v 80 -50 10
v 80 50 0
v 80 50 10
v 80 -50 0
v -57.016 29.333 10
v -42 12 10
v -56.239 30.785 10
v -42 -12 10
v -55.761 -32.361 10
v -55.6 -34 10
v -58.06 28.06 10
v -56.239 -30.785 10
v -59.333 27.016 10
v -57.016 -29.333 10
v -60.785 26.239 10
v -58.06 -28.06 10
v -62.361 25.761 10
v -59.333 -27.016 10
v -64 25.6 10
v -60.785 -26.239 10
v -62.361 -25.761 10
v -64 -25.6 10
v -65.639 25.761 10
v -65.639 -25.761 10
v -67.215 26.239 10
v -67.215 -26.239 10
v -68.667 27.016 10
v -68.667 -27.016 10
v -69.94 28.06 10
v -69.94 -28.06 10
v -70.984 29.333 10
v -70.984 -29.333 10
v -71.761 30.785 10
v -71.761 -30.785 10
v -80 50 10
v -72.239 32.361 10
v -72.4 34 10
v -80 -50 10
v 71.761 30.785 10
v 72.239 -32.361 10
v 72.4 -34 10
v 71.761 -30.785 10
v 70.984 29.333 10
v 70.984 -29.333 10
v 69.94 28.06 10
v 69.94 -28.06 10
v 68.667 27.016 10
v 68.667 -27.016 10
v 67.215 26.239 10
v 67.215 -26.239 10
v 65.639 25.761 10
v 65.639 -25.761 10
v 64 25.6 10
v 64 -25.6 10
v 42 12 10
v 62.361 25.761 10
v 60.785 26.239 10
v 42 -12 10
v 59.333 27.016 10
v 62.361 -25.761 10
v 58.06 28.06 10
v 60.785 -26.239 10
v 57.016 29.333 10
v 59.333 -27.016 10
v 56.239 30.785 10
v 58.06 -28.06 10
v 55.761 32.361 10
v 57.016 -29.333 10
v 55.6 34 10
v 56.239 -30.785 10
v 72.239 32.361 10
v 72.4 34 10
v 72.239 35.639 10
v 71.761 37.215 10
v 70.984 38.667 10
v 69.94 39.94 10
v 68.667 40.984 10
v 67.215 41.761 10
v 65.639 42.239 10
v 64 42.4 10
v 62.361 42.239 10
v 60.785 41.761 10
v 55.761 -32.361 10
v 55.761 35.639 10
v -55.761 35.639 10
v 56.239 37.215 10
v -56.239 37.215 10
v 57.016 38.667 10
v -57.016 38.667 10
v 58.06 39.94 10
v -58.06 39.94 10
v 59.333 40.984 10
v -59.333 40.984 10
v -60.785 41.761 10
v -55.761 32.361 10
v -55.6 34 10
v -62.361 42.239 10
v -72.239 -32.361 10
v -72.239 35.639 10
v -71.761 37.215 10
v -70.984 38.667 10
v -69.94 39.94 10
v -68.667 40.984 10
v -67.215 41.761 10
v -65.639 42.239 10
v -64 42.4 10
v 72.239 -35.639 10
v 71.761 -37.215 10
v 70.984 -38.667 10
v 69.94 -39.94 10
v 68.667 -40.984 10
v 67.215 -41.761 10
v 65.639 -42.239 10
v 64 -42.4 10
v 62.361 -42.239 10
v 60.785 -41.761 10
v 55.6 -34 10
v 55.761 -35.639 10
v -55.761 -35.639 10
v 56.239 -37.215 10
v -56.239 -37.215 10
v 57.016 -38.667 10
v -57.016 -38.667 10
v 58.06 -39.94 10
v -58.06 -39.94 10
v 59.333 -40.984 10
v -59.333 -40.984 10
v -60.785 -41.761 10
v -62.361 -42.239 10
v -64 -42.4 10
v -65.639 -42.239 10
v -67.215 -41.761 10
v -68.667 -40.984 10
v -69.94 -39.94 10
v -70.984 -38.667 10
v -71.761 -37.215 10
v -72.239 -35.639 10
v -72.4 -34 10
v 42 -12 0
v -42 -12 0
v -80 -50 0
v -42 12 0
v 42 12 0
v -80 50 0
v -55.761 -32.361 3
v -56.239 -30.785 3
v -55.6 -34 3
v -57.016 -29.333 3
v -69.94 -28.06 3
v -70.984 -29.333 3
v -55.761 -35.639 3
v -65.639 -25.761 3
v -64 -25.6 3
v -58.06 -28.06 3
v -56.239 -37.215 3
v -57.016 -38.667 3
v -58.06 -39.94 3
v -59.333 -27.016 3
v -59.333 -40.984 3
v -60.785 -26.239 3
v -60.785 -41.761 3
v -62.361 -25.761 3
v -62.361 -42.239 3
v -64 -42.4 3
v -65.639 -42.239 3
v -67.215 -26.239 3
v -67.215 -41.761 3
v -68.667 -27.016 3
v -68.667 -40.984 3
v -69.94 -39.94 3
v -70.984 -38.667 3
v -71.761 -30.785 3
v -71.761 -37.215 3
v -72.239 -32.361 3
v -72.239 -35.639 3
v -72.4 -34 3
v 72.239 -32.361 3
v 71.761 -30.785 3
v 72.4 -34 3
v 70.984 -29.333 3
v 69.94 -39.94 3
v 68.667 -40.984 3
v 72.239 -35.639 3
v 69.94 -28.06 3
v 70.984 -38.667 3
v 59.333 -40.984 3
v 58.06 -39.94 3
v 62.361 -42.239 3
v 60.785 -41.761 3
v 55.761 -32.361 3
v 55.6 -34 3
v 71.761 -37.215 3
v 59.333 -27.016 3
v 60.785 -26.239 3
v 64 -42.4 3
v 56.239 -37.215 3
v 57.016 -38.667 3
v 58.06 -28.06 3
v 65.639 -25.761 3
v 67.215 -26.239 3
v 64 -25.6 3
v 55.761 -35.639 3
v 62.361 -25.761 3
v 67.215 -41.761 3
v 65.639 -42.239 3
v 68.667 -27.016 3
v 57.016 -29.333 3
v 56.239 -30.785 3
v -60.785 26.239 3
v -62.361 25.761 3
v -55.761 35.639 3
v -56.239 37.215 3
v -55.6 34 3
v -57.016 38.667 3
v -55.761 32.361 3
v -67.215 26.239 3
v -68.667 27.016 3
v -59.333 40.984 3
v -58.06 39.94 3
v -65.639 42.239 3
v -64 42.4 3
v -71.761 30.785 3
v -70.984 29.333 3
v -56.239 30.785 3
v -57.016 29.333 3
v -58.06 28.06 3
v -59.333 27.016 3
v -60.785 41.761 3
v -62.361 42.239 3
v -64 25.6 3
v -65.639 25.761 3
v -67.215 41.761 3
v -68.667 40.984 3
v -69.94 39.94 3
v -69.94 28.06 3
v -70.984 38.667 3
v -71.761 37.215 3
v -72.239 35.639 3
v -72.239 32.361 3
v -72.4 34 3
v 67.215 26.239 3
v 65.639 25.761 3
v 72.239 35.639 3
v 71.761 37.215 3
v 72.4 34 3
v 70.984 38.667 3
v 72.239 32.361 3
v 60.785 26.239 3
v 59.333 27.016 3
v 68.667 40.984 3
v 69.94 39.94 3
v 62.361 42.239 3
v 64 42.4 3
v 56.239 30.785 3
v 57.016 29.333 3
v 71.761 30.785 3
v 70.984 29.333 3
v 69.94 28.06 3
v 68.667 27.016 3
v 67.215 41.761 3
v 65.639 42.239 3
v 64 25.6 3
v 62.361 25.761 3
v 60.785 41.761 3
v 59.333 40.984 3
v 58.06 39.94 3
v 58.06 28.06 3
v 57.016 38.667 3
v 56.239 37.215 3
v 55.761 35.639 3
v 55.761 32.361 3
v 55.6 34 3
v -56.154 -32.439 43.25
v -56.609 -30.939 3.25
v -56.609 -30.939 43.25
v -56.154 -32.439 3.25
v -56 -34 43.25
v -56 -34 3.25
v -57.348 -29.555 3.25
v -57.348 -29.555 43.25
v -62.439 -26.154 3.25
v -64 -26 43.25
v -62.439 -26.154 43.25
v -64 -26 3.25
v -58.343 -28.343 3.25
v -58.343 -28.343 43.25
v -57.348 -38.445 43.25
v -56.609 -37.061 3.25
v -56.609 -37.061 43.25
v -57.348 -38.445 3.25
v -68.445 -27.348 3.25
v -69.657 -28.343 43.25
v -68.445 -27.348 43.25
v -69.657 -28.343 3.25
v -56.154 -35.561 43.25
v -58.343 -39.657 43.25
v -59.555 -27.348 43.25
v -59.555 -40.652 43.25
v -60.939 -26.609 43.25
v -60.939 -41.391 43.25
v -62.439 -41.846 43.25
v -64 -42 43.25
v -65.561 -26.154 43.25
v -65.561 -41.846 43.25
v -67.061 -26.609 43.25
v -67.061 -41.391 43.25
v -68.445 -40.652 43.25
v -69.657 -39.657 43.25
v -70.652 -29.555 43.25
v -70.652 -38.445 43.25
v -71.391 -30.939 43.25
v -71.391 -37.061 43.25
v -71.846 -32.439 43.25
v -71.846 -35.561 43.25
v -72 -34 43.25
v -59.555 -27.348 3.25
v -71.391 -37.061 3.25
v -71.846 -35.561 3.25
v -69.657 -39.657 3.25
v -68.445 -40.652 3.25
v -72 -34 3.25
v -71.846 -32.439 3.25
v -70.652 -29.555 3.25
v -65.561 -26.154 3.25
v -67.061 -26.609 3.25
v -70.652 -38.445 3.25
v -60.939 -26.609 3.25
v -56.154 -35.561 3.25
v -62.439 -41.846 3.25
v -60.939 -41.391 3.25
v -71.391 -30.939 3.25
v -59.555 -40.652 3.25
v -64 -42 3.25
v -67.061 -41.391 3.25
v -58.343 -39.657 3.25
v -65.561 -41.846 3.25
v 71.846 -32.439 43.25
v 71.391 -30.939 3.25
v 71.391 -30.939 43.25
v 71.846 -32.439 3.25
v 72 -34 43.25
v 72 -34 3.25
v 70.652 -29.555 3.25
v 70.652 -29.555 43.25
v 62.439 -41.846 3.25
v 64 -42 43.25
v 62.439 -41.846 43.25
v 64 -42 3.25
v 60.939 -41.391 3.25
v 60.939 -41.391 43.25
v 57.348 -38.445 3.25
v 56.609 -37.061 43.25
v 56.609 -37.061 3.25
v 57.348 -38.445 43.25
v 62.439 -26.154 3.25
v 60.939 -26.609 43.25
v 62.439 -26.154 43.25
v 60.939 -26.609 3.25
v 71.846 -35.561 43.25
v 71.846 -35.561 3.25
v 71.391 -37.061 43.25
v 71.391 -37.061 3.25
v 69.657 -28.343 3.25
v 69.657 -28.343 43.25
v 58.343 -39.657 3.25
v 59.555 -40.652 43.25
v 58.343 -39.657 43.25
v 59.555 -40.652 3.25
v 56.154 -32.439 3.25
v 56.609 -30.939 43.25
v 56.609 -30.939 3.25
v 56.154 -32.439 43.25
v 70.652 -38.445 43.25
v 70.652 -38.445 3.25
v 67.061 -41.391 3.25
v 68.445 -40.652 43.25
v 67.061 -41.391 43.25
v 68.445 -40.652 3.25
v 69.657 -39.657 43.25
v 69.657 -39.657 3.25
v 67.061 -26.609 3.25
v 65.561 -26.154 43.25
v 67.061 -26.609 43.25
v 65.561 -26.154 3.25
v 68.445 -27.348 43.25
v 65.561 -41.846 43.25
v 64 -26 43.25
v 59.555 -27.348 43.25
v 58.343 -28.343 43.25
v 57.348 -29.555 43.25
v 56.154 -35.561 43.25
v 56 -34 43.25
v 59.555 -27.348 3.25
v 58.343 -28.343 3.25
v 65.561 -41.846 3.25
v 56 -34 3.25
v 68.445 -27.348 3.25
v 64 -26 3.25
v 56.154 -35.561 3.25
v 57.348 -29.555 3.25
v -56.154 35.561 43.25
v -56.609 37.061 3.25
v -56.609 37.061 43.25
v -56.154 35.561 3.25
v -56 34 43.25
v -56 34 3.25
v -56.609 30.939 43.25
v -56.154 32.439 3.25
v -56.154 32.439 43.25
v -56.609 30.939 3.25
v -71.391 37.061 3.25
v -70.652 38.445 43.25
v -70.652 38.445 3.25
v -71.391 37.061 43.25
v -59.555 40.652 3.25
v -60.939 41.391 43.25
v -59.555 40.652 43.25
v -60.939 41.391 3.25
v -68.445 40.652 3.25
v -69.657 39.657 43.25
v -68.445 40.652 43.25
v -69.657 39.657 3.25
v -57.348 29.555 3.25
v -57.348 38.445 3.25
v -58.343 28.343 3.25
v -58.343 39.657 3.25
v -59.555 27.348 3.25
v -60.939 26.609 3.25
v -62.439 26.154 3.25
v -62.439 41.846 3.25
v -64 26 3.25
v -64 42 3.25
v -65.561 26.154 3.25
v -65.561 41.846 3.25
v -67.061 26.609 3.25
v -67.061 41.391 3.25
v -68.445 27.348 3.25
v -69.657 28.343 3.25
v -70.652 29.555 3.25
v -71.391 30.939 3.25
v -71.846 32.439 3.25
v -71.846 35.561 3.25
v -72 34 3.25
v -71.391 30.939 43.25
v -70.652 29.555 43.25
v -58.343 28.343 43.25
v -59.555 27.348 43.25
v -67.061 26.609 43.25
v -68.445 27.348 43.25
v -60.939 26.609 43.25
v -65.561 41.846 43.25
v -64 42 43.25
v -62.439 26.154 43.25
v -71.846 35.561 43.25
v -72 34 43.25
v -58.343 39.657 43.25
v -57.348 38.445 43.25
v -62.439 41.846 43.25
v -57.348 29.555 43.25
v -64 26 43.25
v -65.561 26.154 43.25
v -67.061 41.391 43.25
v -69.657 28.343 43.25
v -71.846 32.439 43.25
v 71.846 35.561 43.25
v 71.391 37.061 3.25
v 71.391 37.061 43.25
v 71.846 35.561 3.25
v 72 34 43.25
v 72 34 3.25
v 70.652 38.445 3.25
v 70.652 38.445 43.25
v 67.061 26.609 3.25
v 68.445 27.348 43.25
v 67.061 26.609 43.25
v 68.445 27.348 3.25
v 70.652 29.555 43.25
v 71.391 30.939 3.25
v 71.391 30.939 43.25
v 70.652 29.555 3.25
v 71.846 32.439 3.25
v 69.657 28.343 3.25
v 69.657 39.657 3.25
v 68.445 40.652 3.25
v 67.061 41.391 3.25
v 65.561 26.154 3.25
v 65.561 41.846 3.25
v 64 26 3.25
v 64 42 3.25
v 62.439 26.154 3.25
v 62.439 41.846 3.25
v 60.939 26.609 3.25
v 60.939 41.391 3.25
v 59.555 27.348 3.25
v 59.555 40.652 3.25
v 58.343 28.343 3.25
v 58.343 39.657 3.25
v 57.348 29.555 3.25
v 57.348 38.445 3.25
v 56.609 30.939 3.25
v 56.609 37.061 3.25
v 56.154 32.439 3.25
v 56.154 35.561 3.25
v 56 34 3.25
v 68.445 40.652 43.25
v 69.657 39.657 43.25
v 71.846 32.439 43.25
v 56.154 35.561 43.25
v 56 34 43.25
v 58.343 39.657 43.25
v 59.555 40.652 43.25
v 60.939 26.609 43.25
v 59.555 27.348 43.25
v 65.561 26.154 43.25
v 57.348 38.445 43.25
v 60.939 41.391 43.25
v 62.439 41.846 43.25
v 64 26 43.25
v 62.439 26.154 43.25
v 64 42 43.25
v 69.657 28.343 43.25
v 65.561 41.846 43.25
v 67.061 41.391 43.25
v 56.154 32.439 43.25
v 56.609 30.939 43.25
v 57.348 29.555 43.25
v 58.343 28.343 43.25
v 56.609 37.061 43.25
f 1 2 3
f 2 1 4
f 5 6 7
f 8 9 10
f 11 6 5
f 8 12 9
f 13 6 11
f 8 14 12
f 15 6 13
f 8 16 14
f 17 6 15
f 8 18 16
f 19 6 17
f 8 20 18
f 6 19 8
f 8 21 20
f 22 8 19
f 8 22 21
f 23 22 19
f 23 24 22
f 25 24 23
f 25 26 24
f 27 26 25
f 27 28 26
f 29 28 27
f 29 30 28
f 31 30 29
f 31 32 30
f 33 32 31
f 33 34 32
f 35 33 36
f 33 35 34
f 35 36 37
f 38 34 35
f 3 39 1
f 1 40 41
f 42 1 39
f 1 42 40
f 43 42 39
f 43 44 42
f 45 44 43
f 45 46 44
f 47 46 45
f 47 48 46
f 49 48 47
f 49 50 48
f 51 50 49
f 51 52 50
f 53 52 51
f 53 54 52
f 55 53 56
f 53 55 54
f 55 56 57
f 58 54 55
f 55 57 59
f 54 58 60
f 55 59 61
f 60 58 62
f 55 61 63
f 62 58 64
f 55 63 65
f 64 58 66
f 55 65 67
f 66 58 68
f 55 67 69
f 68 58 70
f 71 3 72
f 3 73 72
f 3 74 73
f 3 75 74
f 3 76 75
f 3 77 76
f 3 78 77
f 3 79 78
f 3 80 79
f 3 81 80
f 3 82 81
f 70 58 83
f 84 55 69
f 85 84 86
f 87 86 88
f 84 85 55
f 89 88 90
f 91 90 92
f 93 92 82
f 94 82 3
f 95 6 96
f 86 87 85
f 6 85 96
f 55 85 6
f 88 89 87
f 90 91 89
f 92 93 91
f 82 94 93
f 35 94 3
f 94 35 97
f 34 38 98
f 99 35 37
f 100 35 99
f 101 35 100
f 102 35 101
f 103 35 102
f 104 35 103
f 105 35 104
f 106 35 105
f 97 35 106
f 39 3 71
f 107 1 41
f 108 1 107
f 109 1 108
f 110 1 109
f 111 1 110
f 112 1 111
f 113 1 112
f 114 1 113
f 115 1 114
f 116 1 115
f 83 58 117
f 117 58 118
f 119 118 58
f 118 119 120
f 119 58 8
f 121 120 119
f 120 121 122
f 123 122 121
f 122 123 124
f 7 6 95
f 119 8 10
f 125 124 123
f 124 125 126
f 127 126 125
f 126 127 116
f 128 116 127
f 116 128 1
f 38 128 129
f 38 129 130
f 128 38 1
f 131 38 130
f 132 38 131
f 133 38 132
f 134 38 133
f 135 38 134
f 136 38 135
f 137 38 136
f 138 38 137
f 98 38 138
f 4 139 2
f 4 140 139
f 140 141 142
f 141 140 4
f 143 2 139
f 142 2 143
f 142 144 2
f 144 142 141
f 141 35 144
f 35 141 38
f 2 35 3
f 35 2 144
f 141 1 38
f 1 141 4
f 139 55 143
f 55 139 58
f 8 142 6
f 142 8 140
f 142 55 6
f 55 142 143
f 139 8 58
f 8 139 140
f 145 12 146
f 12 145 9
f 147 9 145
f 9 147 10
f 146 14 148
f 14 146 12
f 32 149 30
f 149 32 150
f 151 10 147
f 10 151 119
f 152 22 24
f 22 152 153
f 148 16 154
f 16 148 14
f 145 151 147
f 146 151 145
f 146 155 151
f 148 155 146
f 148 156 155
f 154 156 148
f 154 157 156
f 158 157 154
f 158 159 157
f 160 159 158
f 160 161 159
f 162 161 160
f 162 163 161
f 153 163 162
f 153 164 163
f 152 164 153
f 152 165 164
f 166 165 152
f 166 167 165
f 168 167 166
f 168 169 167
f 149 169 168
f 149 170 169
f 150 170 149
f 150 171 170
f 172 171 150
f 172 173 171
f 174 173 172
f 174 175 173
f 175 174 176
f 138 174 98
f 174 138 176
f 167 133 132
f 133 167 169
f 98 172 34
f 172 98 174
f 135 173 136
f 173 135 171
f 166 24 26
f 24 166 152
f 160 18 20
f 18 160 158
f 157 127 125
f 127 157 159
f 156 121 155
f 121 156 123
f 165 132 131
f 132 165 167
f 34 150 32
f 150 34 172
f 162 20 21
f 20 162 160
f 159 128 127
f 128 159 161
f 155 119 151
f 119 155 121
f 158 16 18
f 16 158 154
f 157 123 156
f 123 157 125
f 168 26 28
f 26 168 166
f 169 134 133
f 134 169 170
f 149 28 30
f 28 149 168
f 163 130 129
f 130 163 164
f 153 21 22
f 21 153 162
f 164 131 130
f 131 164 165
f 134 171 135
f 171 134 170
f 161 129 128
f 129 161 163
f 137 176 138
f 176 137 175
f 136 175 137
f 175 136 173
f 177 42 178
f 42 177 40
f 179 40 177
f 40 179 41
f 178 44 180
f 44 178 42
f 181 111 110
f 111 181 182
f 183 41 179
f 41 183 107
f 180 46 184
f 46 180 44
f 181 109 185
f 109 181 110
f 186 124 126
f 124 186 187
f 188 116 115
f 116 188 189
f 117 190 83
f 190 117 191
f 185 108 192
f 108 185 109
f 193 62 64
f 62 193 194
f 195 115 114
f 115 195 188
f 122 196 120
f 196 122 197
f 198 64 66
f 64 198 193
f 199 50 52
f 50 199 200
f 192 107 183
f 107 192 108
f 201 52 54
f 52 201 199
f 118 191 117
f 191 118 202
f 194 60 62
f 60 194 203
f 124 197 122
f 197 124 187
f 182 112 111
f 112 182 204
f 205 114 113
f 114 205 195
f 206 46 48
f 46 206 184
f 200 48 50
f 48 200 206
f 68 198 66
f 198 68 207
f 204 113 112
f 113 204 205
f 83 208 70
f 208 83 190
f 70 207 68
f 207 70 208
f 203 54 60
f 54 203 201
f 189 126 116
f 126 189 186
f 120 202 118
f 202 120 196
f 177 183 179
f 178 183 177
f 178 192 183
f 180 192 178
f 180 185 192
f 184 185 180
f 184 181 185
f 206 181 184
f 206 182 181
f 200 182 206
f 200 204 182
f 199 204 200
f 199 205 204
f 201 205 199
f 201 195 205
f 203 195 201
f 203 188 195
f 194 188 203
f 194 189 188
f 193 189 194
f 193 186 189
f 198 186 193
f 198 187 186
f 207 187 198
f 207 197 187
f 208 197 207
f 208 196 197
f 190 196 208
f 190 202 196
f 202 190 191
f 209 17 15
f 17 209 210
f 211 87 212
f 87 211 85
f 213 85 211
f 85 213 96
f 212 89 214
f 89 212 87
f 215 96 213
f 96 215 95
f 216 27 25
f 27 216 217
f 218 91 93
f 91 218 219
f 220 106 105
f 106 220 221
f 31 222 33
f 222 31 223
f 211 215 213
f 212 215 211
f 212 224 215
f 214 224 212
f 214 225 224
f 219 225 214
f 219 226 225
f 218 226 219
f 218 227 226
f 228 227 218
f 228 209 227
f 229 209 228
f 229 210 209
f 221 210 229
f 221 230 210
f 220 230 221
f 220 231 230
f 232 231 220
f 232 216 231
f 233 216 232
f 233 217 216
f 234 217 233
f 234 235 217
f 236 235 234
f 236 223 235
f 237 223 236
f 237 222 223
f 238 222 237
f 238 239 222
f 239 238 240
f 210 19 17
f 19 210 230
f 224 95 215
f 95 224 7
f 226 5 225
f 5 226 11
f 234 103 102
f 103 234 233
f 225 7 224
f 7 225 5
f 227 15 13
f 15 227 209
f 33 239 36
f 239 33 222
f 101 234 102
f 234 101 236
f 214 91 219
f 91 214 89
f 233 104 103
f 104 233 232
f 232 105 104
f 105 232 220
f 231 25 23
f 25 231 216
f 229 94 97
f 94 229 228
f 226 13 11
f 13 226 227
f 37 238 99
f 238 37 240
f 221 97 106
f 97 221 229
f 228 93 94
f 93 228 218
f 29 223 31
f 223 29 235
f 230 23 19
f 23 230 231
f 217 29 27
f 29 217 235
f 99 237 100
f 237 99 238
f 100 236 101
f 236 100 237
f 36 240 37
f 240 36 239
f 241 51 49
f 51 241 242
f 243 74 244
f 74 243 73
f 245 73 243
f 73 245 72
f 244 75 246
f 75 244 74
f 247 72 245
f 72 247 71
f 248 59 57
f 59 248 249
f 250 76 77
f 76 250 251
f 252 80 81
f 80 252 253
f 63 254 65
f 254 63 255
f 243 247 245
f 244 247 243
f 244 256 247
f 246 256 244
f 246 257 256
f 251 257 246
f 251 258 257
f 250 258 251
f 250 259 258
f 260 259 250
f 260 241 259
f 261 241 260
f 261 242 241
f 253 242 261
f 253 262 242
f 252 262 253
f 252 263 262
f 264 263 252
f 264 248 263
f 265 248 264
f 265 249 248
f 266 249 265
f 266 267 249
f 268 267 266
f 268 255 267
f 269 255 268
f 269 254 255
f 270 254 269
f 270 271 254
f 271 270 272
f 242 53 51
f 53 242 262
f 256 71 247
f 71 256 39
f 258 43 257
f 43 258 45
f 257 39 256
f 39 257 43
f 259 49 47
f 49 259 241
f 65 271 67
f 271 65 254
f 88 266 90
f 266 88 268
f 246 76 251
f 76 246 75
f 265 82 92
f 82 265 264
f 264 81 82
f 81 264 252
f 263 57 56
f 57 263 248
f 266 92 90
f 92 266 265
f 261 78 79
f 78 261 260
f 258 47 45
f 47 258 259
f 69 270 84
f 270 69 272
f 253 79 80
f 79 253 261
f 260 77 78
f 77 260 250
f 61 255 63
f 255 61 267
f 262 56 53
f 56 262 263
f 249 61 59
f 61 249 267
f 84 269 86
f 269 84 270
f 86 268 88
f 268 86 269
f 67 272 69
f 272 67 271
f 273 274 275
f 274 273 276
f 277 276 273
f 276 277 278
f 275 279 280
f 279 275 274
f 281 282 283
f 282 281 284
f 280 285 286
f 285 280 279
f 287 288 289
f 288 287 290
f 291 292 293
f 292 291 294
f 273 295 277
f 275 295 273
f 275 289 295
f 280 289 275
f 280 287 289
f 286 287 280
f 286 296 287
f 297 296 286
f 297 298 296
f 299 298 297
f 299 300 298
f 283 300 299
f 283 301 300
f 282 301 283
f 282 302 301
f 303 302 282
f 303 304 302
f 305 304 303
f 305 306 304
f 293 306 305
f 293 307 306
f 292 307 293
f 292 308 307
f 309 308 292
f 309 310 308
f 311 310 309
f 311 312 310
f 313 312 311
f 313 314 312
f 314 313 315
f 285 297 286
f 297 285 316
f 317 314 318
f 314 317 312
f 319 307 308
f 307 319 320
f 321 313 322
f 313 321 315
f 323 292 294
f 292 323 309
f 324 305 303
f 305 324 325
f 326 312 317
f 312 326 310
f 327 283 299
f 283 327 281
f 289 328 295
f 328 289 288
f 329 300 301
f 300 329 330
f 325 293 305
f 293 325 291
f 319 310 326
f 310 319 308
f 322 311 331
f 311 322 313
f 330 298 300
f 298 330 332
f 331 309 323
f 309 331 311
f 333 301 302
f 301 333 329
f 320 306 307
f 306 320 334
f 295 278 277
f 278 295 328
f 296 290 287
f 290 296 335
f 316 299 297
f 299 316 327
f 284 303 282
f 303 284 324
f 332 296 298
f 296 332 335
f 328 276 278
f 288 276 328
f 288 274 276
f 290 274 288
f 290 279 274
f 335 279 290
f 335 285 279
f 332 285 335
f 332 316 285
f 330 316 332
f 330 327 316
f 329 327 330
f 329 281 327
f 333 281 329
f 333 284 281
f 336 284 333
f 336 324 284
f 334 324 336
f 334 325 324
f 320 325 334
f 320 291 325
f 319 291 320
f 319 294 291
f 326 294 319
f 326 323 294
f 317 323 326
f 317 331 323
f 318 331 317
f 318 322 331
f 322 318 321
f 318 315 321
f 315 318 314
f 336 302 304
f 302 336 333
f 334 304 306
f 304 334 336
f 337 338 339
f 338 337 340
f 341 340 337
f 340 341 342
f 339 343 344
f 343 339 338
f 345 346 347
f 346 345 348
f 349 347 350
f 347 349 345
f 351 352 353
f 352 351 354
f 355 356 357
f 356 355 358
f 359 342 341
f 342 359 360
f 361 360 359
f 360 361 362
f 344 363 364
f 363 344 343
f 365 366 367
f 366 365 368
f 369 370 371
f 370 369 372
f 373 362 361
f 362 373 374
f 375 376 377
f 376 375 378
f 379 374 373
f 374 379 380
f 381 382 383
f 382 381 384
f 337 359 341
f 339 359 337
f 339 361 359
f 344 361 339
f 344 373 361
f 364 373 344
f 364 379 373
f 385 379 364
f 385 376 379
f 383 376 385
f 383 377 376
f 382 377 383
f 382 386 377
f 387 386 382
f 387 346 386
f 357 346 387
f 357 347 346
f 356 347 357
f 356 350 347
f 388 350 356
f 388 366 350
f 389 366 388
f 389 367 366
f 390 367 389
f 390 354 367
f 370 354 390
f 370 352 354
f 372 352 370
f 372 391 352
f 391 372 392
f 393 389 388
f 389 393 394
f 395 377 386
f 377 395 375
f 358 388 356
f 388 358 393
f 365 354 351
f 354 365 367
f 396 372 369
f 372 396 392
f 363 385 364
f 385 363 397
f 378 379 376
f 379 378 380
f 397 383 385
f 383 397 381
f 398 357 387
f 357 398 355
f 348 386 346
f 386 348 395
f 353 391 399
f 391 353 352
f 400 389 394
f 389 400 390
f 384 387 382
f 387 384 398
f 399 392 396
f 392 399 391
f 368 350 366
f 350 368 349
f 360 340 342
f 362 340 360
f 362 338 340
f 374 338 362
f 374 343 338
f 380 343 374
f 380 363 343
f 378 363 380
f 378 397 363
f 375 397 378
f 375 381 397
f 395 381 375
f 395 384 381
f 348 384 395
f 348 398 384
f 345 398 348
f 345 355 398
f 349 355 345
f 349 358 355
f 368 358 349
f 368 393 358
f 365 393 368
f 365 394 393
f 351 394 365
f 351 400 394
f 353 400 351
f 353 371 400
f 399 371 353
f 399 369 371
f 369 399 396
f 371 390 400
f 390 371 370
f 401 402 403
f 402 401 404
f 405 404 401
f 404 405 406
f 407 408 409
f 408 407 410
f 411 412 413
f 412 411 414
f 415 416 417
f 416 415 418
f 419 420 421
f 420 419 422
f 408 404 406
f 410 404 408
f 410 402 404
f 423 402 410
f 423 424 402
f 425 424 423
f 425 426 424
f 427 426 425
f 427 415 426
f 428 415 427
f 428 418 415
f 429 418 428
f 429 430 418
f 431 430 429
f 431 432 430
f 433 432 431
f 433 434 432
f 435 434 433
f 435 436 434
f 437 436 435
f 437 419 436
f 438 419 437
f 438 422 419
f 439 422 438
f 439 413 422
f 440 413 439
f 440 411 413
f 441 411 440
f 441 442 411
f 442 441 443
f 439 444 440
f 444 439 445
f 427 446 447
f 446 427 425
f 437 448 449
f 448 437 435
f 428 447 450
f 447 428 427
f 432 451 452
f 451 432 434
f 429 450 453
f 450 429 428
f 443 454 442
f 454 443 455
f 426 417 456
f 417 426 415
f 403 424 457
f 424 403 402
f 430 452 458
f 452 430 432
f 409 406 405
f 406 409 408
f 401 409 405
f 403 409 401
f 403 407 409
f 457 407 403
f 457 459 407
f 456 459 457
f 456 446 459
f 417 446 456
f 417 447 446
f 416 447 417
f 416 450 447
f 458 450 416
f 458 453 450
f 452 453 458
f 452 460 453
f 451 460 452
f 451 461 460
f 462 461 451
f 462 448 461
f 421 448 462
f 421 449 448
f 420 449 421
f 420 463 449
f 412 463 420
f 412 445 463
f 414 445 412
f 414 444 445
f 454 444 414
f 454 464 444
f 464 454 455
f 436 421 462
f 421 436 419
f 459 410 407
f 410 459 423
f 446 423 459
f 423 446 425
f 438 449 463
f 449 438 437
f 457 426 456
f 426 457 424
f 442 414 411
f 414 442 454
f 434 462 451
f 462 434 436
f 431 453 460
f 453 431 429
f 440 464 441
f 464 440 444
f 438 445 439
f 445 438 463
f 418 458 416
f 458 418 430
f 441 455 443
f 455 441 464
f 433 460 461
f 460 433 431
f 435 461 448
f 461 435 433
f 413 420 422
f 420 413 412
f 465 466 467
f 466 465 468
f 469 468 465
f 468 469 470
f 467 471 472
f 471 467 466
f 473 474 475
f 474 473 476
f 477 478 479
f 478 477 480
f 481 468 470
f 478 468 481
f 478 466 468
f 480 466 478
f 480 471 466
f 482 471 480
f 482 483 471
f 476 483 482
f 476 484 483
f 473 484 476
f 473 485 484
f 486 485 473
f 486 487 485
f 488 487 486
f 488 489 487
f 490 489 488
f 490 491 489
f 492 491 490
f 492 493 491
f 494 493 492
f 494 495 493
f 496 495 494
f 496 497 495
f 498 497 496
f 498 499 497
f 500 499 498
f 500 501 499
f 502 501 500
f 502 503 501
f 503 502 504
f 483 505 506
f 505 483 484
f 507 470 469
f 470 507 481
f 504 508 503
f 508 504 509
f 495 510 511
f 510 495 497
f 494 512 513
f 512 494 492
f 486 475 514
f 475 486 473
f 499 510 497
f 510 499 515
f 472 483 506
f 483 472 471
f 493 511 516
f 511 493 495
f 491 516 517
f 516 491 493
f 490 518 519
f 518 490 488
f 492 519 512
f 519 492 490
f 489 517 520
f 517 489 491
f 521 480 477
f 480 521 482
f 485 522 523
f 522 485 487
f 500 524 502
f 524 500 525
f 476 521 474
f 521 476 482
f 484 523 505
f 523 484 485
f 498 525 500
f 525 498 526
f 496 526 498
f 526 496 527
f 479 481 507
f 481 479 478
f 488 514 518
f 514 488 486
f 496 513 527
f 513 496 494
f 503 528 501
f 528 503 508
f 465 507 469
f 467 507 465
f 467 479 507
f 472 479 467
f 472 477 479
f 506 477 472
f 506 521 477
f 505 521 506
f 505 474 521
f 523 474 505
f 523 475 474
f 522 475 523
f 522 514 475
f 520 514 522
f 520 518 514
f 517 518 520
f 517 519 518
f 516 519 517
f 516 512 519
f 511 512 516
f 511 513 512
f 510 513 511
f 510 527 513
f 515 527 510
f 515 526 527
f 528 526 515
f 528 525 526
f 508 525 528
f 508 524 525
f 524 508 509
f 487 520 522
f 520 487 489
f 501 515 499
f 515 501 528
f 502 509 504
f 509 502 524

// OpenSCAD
$fn = 32;

// ------------------------------------------------------------------------
// Frame with four posts: 160 x 100 mm frame, four d16 posts
// Every part is its own module, assembly() places them once.
// ------------------------------------------------------------------------

// --- part 1 ---
module base_frame() {
  difference() {
    translate([-80, -50, 0]) cube([160, 100, 10]);
    translate([-42, -12, -1]) cube([84, 24, 12]);
    translate([-64, -34, 3]) cylinder(h = 8, d = 16.8);
    translate([64, -34, 3]) cylinder(h = 8, d = 16.8);
    translate([-64, 34, 3]) cylinder(h = 8, d = 16.8);
    translate([64, 34, 3]) cylinder(h = 8, d = 16.8);
  }
}

// --- part 2 ---
module post1() {
  cylinder(h = 40, d = 16);
}

// --- part 3 ---
module post2() {
  cylinder(h = 40, d = 16);
}

// --- part 4 ---
module post3() {
  cylinder(h = 40, d = 16);
}

// --- part 5 ---
module post4() {
  cylinder(h = 40, d = 16);
}

// --- assembly ---
module assembly() {
  translate([0, 0, 0]) rotate([0, 0, 0]) base_frame();
  translate([-64, -34, 3.25]) rotate([0, 0, 0]) post1();
  translate([64, -34, 3.25]) rotate([0, 0, 0]) post2();
  translate([-64, 34, 3.25]) rotate([0, 0, 0]) post3();
  translate([64, 34, 3.25]) rotate([0, 0, 0]) post4();
}

assembly();
